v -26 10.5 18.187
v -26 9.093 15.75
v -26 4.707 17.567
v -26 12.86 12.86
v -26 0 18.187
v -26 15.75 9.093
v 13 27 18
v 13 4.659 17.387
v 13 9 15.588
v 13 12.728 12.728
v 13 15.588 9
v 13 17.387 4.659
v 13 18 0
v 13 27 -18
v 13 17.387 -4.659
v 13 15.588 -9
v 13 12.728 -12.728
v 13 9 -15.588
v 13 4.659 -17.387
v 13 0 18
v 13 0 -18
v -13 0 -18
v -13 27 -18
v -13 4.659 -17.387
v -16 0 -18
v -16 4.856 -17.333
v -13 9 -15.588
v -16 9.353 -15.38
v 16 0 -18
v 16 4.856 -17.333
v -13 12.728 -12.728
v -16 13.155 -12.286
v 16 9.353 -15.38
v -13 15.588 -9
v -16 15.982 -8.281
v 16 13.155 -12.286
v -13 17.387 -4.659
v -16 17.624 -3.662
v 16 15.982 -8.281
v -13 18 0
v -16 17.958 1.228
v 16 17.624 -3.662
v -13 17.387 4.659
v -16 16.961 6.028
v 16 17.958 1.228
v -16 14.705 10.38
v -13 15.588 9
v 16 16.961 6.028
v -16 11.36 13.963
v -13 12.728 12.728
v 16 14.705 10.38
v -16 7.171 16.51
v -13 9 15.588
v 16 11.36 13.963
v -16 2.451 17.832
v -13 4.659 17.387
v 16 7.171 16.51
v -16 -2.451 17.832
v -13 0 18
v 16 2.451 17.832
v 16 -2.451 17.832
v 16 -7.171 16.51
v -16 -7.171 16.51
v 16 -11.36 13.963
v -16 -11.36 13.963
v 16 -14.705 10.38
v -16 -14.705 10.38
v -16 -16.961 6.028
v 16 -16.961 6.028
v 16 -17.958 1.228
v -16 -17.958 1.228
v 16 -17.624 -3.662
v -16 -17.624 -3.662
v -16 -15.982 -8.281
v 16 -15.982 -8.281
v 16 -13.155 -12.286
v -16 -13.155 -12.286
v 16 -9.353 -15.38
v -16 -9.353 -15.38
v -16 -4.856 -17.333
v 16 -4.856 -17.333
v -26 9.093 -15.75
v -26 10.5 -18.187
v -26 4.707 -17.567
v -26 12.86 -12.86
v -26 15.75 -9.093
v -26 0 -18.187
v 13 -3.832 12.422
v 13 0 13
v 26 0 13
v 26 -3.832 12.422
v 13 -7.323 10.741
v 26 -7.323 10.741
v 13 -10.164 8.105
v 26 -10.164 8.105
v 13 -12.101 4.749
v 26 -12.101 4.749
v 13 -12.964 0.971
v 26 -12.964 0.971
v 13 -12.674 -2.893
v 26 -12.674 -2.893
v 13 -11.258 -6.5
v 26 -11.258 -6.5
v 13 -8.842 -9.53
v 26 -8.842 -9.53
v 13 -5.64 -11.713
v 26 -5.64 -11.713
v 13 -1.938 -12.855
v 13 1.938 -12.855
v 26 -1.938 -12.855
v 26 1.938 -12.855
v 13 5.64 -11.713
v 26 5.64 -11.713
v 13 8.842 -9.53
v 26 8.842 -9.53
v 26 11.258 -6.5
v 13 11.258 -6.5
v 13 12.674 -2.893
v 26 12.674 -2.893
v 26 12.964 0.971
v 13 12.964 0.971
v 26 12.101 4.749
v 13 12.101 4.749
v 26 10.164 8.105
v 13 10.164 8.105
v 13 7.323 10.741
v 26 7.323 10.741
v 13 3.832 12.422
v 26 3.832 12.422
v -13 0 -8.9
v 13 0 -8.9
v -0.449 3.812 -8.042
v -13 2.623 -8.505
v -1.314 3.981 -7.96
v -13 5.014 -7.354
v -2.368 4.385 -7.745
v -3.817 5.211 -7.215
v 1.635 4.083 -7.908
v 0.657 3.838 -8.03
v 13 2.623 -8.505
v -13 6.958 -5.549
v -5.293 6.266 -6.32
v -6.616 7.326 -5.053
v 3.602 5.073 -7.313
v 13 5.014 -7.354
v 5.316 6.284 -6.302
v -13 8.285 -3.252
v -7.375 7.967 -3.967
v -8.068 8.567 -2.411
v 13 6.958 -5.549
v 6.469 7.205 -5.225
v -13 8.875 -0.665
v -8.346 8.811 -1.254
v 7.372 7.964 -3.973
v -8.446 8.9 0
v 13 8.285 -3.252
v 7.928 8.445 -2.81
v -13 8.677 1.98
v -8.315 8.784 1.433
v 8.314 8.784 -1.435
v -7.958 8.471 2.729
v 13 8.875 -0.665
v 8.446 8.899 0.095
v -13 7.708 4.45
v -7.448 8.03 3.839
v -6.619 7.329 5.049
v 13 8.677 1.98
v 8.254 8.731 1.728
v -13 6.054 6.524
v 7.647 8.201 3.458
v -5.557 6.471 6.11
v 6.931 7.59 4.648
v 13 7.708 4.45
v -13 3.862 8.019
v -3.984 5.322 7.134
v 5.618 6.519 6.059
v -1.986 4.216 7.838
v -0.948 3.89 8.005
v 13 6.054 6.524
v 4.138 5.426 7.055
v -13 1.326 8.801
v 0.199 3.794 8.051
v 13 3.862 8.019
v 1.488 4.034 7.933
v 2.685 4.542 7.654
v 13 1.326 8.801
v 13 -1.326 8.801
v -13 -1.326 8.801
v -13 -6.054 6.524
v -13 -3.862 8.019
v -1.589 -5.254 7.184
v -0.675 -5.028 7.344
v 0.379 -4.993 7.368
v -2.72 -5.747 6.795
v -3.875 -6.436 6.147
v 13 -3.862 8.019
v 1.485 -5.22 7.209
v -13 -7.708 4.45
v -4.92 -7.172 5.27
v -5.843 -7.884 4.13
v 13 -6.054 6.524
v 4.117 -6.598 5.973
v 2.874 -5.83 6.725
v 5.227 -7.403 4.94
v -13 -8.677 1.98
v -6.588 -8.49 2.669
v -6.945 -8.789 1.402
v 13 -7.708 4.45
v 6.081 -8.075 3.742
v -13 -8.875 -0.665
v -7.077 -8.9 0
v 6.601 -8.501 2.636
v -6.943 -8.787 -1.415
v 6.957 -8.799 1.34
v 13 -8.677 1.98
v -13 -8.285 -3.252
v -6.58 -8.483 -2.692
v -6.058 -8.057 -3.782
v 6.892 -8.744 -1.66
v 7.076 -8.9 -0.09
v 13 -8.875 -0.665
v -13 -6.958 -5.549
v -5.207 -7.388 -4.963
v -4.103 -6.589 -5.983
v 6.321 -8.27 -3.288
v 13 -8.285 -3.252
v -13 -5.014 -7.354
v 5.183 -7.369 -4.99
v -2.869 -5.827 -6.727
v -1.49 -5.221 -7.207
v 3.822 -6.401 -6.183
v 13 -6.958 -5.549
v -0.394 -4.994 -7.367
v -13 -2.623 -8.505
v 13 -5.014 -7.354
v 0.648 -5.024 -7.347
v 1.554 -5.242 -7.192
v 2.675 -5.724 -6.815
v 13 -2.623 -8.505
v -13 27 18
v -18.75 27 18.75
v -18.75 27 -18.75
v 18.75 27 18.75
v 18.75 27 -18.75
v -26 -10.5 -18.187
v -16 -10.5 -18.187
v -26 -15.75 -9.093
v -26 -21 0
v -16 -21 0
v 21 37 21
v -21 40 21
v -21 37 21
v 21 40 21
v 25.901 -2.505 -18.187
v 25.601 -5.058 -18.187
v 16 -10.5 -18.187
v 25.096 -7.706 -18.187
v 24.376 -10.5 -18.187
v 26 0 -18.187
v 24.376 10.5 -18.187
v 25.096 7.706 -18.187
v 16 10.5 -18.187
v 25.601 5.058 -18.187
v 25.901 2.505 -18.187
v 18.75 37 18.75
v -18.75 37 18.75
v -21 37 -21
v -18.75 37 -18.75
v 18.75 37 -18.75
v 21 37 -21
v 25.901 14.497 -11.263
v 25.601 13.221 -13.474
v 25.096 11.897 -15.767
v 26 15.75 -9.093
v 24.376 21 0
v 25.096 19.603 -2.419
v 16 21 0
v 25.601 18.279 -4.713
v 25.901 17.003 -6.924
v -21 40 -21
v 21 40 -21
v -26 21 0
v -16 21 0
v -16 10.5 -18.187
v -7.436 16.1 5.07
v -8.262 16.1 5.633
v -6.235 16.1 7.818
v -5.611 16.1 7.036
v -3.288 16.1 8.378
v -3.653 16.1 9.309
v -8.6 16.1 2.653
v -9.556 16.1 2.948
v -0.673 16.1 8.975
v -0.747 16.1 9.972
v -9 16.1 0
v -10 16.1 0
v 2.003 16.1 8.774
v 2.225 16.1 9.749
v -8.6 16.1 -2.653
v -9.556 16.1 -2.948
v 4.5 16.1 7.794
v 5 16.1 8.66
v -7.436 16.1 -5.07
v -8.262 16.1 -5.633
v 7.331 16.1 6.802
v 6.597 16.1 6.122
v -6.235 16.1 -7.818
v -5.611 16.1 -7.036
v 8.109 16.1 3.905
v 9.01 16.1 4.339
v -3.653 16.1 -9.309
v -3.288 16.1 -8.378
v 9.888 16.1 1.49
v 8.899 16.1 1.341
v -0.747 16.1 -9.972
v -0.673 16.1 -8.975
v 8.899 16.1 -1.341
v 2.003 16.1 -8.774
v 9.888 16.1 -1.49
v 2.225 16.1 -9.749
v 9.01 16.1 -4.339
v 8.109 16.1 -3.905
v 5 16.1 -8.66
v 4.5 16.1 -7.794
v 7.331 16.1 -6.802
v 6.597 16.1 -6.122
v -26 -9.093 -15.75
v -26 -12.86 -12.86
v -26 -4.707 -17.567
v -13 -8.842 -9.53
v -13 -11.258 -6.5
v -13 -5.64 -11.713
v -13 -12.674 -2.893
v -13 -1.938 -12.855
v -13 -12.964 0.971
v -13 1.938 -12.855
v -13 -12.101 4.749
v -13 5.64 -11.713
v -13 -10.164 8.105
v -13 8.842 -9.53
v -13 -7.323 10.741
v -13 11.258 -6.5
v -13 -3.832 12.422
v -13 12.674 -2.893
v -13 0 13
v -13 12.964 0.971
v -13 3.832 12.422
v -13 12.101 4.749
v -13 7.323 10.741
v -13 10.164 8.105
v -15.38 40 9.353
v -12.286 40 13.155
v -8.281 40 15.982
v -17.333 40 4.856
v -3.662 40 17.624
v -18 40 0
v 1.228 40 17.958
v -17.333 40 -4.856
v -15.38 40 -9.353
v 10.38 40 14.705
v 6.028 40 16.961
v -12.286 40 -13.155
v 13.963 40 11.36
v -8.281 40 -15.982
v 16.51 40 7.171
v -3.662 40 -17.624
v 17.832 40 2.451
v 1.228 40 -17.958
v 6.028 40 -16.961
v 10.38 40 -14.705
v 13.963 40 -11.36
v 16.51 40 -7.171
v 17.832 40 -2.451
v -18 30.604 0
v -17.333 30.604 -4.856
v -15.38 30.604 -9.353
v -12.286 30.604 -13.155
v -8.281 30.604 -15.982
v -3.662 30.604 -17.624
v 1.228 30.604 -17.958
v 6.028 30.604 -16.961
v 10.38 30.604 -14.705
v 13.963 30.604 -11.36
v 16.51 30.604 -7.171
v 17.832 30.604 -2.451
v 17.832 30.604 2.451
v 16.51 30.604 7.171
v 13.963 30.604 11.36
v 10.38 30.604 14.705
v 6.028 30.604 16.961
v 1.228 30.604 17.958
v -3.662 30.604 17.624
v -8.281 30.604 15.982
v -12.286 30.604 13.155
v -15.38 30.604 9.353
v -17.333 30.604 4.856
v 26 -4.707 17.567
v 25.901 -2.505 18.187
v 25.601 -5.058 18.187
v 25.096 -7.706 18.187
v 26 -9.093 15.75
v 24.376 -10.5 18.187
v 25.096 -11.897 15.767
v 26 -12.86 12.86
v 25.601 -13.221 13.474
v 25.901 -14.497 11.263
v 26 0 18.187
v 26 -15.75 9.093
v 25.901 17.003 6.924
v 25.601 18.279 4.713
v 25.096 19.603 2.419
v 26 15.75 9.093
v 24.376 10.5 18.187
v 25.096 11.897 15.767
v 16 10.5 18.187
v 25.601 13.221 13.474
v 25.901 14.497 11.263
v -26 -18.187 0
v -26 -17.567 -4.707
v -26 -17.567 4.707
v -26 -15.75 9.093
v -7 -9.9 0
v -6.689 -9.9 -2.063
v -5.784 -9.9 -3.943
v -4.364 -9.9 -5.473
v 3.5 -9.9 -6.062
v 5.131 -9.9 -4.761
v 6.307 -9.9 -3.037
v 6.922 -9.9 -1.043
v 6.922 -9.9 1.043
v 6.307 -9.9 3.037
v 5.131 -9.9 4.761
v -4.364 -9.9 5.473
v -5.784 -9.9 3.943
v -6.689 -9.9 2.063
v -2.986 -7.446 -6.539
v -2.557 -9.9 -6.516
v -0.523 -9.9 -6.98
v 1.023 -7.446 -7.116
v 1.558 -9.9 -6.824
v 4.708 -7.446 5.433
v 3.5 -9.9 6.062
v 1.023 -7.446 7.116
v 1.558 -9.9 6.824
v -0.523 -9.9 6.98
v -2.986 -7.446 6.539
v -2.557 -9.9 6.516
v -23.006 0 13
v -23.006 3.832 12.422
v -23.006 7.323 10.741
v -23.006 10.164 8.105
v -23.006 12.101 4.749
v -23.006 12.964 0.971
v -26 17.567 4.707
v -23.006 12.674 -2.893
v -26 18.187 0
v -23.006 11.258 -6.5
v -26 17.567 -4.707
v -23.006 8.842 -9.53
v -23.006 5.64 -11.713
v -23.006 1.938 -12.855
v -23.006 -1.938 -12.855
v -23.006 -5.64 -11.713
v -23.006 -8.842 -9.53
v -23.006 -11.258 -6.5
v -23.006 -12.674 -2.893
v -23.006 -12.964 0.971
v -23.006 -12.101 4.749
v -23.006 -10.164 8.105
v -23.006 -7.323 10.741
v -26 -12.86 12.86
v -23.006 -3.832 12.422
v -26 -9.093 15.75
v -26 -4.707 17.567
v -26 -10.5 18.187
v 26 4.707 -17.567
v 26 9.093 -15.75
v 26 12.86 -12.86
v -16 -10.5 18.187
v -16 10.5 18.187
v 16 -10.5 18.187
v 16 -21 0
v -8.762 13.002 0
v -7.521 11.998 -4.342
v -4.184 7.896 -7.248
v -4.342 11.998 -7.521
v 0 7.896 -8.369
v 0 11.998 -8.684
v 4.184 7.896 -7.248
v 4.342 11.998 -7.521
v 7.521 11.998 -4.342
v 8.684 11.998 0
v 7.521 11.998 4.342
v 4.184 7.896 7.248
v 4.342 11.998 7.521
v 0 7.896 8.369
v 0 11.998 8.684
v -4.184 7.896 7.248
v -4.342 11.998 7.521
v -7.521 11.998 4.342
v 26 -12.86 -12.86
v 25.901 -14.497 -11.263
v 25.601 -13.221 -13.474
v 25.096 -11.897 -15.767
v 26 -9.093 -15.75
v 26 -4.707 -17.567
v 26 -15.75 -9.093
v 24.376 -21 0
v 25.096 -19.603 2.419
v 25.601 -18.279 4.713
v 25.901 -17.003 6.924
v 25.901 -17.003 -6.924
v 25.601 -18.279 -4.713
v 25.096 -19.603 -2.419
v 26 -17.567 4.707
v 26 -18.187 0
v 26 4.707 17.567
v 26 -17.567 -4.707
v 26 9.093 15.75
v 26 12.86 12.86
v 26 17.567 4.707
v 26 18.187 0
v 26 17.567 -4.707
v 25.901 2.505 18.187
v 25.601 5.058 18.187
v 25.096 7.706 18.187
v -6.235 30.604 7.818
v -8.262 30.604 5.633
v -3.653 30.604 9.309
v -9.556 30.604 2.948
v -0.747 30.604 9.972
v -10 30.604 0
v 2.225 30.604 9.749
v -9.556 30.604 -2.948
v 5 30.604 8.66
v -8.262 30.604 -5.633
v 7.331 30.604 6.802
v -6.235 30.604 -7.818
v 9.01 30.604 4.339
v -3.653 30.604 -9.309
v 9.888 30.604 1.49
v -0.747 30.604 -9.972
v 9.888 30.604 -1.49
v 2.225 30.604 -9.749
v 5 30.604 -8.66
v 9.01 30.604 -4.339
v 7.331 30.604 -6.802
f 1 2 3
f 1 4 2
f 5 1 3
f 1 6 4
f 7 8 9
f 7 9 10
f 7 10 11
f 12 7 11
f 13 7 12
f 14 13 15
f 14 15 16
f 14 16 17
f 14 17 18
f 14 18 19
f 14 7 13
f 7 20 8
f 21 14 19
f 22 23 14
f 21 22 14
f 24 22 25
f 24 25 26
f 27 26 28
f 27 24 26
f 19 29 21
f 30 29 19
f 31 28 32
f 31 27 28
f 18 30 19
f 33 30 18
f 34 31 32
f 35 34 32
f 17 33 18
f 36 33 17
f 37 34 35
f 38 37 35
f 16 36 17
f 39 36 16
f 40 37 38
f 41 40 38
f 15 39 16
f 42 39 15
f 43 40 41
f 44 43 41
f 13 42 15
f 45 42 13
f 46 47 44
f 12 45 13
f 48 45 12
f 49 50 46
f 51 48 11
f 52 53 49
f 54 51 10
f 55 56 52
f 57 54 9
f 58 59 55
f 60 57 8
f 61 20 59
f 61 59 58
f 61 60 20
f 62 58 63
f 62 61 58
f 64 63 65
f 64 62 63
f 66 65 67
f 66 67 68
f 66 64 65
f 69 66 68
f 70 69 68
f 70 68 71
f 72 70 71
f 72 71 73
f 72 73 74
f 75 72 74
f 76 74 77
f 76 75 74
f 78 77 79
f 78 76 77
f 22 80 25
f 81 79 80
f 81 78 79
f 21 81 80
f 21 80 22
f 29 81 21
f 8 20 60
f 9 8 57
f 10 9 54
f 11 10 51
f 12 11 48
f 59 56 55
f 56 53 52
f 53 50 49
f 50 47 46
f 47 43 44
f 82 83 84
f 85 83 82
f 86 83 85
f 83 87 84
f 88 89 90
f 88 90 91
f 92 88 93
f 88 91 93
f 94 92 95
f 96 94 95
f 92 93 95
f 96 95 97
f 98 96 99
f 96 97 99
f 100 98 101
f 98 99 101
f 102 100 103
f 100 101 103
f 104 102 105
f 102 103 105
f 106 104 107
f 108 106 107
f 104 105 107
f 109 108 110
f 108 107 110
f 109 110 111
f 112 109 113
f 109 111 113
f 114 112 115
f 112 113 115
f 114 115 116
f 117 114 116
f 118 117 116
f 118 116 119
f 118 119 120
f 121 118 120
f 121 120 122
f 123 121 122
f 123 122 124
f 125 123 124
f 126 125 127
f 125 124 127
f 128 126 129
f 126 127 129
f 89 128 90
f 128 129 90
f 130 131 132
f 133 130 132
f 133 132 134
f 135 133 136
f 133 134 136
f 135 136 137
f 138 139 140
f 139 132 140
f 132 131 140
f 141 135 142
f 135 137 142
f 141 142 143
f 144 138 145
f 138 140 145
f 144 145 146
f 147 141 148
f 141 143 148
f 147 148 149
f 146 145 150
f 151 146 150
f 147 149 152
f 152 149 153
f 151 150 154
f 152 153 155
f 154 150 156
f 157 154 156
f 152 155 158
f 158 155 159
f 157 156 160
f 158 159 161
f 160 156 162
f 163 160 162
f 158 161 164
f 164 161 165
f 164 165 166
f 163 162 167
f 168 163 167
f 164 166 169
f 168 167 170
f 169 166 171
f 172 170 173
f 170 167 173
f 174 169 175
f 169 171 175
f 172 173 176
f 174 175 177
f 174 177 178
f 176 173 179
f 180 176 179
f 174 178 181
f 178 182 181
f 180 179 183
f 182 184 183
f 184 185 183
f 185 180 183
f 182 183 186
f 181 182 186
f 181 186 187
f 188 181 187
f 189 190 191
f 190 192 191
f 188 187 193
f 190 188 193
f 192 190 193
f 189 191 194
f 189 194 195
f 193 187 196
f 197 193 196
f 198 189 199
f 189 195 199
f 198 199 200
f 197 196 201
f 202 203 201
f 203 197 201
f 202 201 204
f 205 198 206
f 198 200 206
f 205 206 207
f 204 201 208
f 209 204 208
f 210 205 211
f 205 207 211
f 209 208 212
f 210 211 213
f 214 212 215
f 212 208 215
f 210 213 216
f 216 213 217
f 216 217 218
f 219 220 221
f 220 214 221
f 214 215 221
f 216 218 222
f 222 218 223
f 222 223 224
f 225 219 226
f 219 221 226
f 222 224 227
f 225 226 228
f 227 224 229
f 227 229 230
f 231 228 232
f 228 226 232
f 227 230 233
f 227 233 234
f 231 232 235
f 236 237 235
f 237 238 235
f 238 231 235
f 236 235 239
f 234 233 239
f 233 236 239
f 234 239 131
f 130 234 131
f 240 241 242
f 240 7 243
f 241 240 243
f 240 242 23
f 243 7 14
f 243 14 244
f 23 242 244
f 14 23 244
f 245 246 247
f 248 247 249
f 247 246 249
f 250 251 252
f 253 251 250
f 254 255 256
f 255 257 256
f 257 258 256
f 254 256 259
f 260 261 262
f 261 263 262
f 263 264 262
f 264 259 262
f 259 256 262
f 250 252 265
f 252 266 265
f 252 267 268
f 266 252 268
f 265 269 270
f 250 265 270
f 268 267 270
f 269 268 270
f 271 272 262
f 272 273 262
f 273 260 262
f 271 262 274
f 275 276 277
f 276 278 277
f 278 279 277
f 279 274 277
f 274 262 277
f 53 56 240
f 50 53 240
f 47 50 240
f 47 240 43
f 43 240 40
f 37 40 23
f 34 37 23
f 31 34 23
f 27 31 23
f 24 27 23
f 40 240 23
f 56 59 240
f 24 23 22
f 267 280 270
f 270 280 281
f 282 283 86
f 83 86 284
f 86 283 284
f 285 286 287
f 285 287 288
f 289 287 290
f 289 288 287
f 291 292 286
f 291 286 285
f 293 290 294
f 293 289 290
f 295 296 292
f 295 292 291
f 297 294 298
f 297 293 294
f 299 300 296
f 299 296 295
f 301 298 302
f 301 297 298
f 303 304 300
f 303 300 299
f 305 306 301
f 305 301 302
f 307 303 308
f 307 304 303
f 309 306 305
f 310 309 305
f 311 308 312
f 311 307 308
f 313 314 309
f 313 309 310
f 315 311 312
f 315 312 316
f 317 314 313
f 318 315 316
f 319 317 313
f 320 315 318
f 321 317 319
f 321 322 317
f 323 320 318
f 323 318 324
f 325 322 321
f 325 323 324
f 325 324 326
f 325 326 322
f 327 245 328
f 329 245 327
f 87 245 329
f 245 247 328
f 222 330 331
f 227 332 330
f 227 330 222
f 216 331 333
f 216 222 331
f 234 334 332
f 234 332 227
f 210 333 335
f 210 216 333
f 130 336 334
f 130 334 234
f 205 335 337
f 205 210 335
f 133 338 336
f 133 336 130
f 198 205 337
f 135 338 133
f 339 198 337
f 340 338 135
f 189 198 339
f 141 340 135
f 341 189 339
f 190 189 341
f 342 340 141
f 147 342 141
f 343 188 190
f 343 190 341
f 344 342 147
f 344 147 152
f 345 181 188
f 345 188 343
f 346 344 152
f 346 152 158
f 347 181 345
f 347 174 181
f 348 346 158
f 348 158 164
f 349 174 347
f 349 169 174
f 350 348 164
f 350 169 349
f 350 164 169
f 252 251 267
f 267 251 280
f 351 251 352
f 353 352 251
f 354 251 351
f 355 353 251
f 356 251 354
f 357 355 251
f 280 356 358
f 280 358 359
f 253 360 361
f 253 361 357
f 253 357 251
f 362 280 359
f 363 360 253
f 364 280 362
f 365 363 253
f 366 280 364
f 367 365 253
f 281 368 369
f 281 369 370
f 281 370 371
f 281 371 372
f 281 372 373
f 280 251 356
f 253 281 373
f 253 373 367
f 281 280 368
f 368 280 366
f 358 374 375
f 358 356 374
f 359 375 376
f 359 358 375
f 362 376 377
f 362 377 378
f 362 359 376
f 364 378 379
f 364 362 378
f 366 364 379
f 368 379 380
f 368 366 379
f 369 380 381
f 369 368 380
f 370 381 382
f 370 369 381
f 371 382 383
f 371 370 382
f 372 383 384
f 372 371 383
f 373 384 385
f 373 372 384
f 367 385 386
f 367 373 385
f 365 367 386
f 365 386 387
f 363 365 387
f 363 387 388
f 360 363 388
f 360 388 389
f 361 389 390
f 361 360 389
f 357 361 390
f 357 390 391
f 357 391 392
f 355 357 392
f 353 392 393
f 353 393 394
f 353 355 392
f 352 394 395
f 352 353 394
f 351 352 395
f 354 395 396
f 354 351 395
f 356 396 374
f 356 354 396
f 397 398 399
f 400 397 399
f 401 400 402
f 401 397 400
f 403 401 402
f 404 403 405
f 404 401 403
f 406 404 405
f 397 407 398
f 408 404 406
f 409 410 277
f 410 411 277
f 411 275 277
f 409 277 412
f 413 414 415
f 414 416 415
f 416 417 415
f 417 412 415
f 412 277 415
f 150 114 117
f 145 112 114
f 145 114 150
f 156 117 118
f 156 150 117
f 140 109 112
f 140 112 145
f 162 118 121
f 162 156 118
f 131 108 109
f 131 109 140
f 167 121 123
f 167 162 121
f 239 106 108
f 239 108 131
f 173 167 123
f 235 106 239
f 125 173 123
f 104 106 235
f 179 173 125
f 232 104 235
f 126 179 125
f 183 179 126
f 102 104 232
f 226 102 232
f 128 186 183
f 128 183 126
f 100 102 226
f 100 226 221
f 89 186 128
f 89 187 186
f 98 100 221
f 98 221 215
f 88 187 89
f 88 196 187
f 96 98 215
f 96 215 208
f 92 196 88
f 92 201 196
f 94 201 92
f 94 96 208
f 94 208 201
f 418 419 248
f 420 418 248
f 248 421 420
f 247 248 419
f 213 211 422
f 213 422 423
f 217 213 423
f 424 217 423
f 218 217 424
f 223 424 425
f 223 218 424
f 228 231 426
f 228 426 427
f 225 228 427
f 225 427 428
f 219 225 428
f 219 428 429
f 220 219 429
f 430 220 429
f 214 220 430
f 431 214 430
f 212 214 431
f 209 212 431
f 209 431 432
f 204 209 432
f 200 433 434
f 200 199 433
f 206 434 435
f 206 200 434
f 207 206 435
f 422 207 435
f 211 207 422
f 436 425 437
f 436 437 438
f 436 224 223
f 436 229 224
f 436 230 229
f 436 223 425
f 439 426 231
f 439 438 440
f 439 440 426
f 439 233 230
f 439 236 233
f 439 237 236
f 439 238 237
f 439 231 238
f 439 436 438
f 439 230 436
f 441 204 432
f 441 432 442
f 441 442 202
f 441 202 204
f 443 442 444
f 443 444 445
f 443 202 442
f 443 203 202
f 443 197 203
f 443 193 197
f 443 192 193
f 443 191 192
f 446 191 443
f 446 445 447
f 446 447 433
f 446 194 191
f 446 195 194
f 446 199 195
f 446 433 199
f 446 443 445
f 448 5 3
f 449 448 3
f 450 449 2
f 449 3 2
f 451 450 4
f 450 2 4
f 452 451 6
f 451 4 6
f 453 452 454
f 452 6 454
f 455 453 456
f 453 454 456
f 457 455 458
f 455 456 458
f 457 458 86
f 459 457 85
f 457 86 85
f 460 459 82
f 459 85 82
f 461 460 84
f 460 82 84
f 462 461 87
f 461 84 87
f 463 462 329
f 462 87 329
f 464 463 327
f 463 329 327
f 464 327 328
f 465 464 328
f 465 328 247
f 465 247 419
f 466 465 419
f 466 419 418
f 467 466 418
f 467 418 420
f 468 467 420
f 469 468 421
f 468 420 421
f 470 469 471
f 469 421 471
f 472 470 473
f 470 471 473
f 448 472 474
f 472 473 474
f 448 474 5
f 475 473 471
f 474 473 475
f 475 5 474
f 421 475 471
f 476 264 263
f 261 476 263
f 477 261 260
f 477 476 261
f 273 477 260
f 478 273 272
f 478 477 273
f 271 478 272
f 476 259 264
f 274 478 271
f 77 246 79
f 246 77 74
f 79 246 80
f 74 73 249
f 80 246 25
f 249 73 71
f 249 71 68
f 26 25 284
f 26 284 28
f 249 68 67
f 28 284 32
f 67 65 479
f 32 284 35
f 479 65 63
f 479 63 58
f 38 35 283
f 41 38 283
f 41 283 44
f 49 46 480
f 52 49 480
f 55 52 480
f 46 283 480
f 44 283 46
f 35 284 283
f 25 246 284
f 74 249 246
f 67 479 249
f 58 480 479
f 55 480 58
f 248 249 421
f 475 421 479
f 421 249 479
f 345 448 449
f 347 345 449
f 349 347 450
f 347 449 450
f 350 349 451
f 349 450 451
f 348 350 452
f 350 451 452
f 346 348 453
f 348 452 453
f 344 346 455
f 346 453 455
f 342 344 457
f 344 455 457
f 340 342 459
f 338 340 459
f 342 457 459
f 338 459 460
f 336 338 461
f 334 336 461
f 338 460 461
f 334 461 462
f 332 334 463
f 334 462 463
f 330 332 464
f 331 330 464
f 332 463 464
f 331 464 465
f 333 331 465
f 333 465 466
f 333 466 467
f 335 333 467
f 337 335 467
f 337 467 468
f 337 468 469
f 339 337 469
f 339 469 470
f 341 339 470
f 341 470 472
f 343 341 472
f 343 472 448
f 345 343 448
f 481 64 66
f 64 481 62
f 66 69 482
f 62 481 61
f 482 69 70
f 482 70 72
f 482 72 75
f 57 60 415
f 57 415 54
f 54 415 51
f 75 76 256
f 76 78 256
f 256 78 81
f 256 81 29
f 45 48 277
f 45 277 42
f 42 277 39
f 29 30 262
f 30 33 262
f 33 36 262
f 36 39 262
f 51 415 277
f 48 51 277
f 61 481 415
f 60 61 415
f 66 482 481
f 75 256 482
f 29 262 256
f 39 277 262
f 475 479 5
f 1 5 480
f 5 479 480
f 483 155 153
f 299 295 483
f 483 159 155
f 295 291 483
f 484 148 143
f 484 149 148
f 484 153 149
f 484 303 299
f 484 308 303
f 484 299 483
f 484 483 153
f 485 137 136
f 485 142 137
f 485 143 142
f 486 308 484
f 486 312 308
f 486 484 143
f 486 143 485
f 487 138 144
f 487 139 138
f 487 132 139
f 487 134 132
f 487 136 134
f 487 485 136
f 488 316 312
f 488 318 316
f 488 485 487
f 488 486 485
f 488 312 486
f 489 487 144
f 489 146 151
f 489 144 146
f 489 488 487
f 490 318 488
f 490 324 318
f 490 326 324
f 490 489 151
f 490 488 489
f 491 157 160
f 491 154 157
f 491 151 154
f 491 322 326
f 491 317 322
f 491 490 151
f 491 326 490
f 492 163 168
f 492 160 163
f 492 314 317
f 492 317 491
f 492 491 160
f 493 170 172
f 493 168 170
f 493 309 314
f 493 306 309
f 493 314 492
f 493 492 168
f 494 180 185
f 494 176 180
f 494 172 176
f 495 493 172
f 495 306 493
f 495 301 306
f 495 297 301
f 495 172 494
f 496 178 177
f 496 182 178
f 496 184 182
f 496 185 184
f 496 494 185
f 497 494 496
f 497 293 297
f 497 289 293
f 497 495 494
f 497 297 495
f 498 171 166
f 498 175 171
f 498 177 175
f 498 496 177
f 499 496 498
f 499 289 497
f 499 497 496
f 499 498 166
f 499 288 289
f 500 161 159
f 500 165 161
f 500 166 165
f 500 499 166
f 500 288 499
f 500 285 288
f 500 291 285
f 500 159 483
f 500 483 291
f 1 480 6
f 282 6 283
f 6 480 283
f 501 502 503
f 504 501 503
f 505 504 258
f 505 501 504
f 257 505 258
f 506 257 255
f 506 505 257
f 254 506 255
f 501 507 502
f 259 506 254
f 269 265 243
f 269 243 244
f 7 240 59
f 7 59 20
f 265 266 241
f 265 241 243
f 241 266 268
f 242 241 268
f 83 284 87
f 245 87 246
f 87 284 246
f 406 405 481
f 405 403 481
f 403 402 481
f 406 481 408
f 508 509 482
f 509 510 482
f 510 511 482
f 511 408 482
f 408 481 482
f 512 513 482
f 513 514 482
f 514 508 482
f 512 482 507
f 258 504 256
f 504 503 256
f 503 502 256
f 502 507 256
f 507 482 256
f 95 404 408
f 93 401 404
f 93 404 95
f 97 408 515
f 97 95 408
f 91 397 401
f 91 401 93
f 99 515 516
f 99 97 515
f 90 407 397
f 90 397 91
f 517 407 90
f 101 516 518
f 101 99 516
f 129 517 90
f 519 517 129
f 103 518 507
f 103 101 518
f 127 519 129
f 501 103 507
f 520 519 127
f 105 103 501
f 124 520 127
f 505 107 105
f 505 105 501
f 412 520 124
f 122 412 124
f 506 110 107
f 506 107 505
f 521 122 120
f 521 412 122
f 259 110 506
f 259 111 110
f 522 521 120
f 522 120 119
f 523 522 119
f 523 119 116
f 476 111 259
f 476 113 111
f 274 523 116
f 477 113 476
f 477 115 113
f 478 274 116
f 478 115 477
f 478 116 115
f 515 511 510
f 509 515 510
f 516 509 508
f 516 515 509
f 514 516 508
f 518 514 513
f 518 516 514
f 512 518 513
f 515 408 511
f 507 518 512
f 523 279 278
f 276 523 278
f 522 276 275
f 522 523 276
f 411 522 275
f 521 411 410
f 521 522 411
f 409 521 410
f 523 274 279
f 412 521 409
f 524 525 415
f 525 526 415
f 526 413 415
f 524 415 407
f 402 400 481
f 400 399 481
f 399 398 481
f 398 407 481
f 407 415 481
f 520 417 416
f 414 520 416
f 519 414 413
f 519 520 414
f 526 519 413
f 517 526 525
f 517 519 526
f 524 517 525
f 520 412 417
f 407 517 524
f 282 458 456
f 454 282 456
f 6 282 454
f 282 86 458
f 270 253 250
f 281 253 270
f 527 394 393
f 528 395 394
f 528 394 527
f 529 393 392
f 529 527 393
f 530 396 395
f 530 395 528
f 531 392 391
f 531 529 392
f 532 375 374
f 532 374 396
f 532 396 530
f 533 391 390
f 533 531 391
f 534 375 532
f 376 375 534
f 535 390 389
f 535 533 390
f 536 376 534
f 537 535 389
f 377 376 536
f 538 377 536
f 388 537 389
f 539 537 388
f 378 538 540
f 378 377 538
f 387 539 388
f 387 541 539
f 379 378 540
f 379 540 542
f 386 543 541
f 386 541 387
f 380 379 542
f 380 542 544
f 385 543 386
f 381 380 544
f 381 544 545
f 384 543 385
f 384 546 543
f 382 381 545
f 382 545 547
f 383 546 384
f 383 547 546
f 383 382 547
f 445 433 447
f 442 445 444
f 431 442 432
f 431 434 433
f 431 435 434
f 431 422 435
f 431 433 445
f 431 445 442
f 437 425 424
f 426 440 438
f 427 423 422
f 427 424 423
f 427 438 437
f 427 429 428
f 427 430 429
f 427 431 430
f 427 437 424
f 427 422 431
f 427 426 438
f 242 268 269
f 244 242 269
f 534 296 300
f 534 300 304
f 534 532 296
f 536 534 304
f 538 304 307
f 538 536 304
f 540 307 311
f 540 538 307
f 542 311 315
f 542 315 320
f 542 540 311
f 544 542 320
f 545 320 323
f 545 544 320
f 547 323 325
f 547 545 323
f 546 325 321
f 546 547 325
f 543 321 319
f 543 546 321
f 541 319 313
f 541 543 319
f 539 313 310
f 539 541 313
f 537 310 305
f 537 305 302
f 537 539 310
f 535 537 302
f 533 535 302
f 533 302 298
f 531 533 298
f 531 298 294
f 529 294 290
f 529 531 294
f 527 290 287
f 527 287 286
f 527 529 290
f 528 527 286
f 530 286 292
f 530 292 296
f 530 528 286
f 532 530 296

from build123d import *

# Parameters (mm, degrees)
SKETCH1_R                 = 18
BOSS_EXTRUDE1_DEPTH       = 16
BOSS_EXTRUDE2_DEPTH       = 10
BOSS_EXTRUDE6_DEPTH       = 10
SKETCH5_R                 = 13
CUT_EXTRUDE1_DEPTH        = 13
SKETCH6_R                 = 13
CUT_EXTRUDE2_DEPTH        = 13
SKETCH7_R                 = 8.9
CUT_EXTRUDE3_DEPTH        = 48.882669099
SKETCH8_OUTSIDE_W         = 70.914
SKETCH8_OUTSIDE_H         = 76.54
SKETCH8_OUTSIDE_R         = 18.186533479
CUT_EXTRUDE4_DEPTH        = 5
CUT_EXTRUDE4_DRAFT        = -60
SKETCH9_R                 = 18.186533479
CUT_EXTRUDE5_DEPTH        = 5
CUT_EXTRUDE5_DRAFT        = -60
SKETCH10_W                = 42
SKETCH10_H                = 42
BOSS_EXTRUDE8_DEPTH       = 3
SKETCH11_W                = 37.5
SKETCH11_H                = 37.5
BOSS_EXTRUDE9_DEPTH       = 13
BOSS_EXTRUDE10_REACH      = 71.556
BOSS_EXTRUDE10_END_RADIUS = 18
SKETCH12_W                = 26
SKETCH12_H                = 36


with BuildPart() as part:
    # Sketch1 → Boss-Extrude1 (new, symmetric)
    with BuildSketch(Plane(origin=(0, 0, 0), x_dir=(0, 0, -1), z_dir=(1, 0, 0))):
        Circle(SKETCH1_R)
    extrude(amount=BOSS_EXTRUDE1_DEPTH, both=True)

    # Sketch2 → Boss-Extrude2 (add)
    with BuildSketch(Plane(origin=(16, 0, 0), x_dir=(0, 0, -1), z_dir=(1, 0, 0))):
        Polygon((0, 21), (-18.186533479, 10.5), (-18.186533479, -10.5), (0, -21), (18.186533479, -10.5), (18.186533479, 10.5), align=None)
    extrude(amount=BOSS_EXTRUDE2_DEPTH)

    # Sketch4 → Boss-Extrude6 (add)
    with BuildSketch(Plane.ZY.offset(16)):
        Polygon((18.186533479, 10.5), (0, 21), (-18.186533479, 10.5), (-18.186533479, -10.5), (0, -21), (18.186533479, -10.5), align=None)
    extrude(amount=BOSS_EXTRUDE6_DEPTH)

    # Sketch5 → Cut-Extrude1 (cut)
    with BuildSketch(Plane.ZY.offset(26)):
        Circle(SKETCH5_R)
    extrude(amount=-CUT_EXTRUDE1_DEPTH, mode=Mode.SUBTRACT)

    # Sketch6 → Cut-Extrude2 (cut)
    with BuildSketch(Plane(origin=(26, 0, 0), x_dir=(0, 0, -1), z_dir=(1, 0, 0))):
        with Locations(Location((0, 0, 0), (0, 0, 180))):
            Circle(SKETCH6_R)
    extrude(amount=-CUT_EXTRUDE2_DEPTH, mode=Mode.SUBTRACT)

    # Sketch7 → Cut-Extrude3 (cut, through all)
    with BuildSketch(Plane(origin=(13, 0, 0), x_dir=(0, 0, -1), z_dir=(1, 0, 0))):
        Circle(SKETCH7_R)
    extrude(amount=-CUT_EXTRUDE3_DEPTH, mode=Mode.SUBTRACT)


with BuildPart() as cut_extrude4_tool:
    # Sketch8 outside → Cut-Extrude4 (with draft: the straight prism first)
    with BuildSketch(Plane(origin=(26, 0, 0), x_dir=(0, 0, -1), z_dir=(1, 0, 0))):
        Rectangle(SKETCH8_OUTSIDE_W, SKETCH8_OUTSIDE_H)
        Circle(SKETCH8_OUTSIDE_R, mode=Mode.SUBTRACT)
    extrude(amount=-CUT_EXTRUDE4_DEPTH)
    # Cut-Extrude4: the draft: its side faces are tilted about the plane it starts from
    cut_extrude4_sides = [cut_extrude4_tool.faces().sort_by_distance(p)[0] for p in [
        (23.5, -38.27, 0),
        (23.5, 0, -35.457),
        (23.5, 38.27, 0),
        (23.5, 0, 35.457),
        (23.5, 0, 18.186533479),
    ]]
    draft(cut_extrude4_sides, Plane(origin=(26, 0, 0), x_dir=(0, 0, -1), z_dir=(1, 0, 0)), CUT_EXTRUDE4_DRAFT)


with BuildPart() as part_1:
    add(part.part)

    # Cut-Extrude4: cut by cut_extrude4_tool
    add(cut_extrude4_tool.part, mode=Mode.SUBTRACT)


with BuildPart() as cut_extrude5_tool:
    # Sketch9 → Cut-Extrude5 (with draft: the straight prism first)
    with BuildSketch(Plane.ZY.offset(26)):
        Circle(SKETCH9_R)
    extrude(amount=-CUT_EXTRUDE5_DEPTH)
    # Cut-Extrude5: the draft: its side faces are tilted about the plane it starts from
    cut_extrude5_sides = [cut_extrude5_tool.faces().sort_by_distance(p)[0] for p in [
        (-23.5, 0, -18.186533479),
    ]]
    draft(cut_extrude5_sides, Plane.ZY.offset(26), CUT_EXTRUDE5_DRAFT)


with BuildPart() as part_2:
    add(part_1.part)

    # Cut-Extrude5: cut by cut_extrude5_tool
    add(cut_extrude5_tool.part, mode=Mode.SUBTRACT)



with BuildPart() as body_2:
    # Sketch10 → Boss-Extrude8 (new body)
    with BuildSketch(Plane(origin=(0, 40, 0), x_dir=(1, 0, 0), z_dir=(0, 1, 0))):
        Rectangle(SKETCH10_W, SKETCH10_H)
    extrude(amount=-BOSS_EXTRUDE8_DEPTH)

    # Sketch11 → Boss-Extrude9 (add)
    with BuildSketch(Plane(origin=(0, 40, 0), x_dir=(1, 0, 0), z_dir=(0, 1, 0))):
        Rectangle(SKETCH11_W, SKETCH11_H)
    extrude(amount=-BOSS_EXTRUDE9_DEPTH)


with BuildPart() as part_3:
    add(part_2.part)

    add(body_2.part)  # Boss-Extrude10 merges body 2
    # Boss-Extrude10: up to this cylinder (the profile starts outside it)
    boss_extrude10_end = Plane(origin=(0, 0, 0), z_dir=(-1, 0, 0)) * Cylinder(BOSS_EXTRUDE10_END_RADIUS, 180.112, mode=Mode.PRIVATE)
    # Sketch12 → Boss-Extrude10 (add, up to the surface)
    with BuildSketch(Plane(origin=(0, 40, 0), x_dir=(1, 0, 0), z_dir=(0, 1, 0)), mode=Mode.PRIVATE) as boss_extrude10_sk1:
        Rectangle(SKETCH12_W, SKETCH12_H)
    boss_extrude10_tool1 = extrude(boss_extrude10_sk1.sketch, amount=-BOSS_EXTRUDE10_REACH, mode=Mode.PRIVATE) - boss_extrude10_end
    add(boss_extrude10_tool1.solids().sort_by_distance((0, 40, 0))[0])

    # Sketch13 → Cut-Revolve1 (revolve, cut)
    with BuildSketch(Plane.XY, mode=Mode.PRIVATE) as cut_revolve1_sk:
        Polygon((0, 40), (0, -9.9), (7, -9.9), (9, 16.1), (10, 16.1), (10, 30.604253251), (18, 30.604253251), (18, 40), align=None)
    revolve(cut_revolve1_sk.sketch.rotate(Axis((0, 40, 0), (0, -1, 0)), 180), axis=Axis((0, 40, 0), (0, -1, 0)), mode=Mode.SUBTRACT)


solid = part_3.part
